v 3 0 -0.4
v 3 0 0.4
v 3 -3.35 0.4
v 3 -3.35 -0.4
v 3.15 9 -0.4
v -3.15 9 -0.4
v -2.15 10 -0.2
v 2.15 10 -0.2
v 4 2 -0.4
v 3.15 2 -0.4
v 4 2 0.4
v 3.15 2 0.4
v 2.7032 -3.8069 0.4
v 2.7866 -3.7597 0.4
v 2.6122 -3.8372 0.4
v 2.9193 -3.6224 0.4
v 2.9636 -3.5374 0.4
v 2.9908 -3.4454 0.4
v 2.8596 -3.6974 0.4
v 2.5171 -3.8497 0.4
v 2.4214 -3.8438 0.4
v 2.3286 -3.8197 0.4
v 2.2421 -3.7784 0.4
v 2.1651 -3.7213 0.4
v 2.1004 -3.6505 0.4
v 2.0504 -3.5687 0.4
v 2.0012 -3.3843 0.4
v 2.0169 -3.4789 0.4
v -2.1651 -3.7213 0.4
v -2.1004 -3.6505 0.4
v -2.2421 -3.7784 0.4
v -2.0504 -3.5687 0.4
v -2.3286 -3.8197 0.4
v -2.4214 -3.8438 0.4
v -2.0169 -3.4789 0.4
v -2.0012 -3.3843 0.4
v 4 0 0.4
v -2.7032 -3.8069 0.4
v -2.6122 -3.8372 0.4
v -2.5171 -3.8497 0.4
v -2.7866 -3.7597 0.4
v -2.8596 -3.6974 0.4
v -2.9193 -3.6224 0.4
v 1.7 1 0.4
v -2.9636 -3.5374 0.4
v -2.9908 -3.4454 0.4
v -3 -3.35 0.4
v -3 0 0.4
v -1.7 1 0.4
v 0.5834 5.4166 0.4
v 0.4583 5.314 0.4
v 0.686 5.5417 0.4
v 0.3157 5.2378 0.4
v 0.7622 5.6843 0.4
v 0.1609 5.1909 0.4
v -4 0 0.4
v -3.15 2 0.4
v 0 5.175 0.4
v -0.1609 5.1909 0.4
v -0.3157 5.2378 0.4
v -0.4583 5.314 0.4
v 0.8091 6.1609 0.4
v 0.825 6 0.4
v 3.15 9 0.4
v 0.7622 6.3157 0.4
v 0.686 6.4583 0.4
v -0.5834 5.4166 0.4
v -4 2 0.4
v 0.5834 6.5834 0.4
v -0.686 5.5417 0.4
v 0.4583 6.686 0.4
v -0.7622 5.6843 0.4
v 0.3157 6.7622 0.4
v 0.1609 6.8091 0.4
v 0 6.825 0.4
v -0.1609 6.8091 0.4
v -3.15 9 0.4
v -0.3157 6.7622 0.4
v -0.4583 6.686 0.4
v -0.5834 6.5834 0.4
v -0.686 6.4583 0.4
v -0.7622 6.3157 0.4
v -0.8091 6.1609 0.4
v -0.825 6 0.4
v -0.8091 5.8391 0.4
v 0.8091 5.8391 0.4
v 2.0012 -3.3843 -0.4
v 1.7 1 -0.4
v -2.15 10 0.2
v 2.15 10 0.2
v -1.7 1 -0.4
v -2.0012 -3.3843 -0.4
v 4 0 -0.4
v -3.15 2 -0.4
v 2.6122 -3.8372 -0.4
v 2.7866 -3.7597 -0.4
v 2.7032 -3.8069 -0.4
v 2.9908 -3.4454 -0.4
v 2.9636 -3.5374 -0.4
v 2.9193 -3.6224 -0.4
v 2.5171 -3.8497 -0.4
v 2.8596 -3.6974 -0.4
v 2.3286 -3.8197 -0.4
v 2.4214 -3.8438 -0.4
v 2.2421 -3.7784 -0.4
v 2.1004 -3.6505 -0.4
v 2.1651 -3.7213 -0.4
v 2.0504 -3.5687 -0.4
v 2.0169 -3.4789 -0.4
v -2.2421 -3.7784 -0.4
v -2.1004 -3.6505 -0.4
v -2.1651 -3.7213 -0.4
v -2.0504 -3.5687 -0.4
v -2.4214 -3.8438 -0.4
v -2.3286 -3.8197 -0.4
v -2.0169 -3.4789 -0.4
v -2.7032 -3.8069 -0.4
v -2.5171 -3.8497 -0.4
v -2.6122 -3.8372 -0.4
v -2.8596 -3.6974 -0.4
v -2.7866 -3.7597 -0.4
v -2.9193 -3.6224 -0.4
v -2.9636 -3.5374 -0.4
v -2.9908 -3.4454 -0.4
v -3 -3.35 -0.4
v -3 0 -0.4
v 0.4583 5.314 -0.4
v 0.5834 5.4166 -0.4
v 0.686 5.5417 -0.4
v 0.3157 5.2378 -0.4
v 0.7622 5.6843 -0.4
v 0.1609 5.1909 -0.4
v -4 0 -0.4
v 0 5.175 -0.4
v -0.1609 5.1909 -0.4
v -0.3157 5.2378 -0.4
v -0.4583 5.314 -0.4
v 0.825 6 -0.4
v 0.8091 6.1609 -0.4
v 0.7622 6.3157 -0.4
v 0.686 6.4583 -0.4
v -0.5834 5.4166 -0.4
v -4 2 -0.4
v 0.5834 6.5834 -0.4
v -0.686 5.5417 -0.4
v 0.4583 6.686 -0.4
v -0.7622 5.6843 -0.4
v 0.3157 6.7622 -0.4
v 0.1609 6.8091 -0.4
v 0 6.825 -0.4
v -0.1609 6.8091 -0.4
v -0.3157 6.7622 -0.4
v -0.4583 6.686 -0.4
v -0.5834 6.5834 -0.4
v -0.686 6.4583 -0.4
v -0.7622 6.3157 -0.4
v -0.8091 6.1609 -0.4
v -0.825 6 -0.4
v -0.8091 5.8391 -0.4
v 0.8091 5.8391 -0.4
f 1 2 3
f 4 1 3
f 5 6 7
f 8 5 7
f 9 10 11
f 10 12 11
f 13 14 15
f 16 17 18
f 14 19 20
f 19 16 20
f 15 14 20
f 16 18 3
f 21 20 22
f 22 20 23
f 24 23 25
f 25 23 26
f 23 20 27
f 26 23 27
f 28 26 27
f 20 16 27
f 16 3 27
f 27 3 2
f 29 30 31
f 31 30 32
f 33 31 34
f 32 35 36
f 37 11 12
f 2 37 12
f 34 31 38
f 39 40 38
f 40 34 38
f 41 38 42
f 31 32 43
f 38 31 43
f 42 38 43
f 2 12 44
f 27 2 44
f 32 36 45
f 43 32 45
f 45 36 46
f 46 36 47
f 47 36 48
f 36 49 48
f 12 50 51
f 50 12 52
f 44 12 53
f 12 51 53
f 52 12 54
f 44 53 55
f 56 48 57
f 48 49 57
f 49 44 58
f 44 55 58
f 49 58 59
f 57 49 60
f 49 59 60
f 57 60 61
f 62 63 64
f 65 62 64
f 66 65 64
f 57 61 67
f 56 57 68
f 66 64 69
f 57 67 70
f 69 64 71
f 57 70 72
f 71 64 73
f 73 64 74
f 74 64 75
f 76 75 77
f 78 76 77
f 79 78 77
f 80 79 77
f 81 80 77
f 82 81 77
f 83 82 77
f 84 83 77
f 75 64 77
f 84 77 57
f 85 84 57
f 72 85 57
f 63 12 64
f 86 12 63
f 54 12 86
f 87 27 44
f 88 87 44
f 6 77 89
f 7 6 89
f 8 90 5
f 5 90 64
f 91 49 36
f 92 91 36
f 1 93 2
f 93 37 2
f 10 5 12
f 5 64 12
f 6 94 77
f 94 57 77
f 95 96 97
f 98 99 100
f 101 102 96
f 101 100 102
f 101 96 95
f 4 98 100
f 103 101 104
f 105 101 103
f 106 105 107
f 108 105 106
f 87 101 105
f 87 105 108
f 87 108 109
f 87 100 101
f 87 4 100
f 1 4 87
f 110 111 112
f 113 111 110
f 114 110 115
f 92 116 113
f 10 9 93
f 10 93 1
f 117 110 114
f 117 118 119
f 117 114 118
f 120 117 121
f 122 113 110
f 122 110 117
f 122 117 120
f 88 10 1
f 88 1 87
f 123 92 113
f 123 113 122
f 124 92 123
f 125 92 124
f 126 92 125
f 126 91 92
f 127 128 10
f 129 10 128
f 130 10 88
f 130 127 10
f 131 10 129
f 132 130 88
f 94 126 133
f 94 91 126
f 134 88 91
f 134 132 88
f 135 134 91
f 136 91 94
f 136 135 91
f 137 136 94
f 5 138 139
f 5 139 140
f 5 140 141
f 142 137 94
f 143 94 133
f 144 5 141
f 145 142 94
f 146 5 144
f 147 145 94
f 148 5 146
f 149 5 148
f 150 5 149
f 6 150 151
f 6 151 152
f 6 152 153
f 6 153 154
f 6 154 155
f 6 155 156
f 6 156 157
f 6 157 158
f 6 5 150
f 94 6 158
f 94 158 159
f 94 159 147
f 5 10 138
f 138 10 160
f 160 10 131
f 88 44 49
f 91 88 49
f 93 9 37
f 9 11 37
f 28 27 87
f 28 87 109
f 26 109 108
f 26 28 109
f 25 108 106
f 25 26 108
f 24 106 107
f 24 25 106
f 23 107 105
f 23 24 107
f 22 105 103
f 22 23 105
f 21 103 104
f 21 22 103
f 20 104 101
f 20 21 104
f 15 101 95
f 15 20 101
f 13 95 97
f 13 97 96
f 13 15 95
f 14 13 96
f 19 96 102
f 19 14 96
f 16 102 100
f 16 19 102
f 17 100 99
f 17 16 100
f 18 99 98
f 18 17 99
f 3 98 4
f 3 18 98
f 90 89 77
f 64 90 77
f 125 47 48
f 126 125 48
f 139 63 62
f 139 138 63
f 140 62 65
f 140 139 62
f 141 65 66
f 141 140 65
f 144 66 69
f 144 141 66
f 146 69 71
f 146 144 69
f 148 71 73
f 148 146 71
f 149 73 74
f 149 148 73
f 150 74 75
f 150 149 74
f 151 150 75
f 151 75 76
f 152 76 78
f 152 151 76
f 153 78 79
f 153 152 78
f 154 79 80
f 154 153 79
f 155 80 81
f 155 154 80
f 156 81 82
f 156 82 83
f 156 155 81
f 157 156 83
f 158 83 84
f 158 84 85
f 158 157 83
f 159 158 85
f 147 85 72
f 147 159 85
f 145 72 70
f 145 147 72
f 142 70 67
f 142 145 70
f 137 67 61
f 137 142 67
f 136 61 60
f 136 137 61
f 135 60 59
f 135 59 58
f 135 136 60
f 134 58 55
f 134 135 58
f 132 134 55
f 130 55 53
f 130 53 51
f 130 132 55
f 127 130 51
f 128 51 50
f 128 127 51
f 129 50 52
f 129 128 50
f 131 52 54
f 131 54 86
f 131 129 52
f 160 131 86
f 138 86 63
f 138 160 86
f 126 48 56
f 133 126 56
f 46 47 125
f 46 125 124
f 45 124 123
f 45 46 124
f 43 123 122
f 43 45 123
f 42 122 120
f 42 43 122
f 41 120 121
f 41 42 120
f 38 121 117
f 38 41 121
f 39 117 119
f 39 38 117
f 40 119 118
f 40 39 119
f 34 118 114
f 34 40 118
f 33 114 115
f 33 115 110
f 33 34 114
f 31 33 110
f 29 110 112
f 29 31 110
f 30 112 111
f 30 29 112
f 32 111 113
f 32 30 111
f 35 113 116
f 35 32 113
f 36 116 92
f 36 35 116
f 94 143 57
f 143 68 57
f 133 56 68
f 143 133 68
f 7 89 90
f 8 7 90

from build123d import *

# Parameters (mm, degrees)
SKETCH_R     = 0.825
PAD_DEPTH    = 0.4
POCKET_DEPTH = 7.151


with BuildPart() as part:
    # Sketch → Pad (new body, symmetric)
    with BuildSketch(Plane.XY):
        with BuildLine():
            Line((-4, 0), (-4, 2))
            Line((-4, 2), (-3.15, 2))
            Line((-3.15, 2), (-3.15, 9))
            Line((-3.15, 9), (-2.15, 10))
            Line((-2.15, 10), (2.15, 10))
            Line((2.15, 10), (3.15, 9))
            Line((3.15, 9), (3.15, 2))
            Line((3.15, 2), (4, 2))
            Line((4, 2), (4, 0))
            Line((4, 0), (3, 0))
            Line((3, 0), (3, -3.35))
            ThreePointArc((2.001176, -3.384267), (2.517143, -3.849706), (3, -3.35))
            Line((2.001176, -3.384267), (1.7, 1))
            Line((1.7, 1), (-1.7, 1))
            Line((-1.7, 1), (-2.001176, -3.384267))
            ThreePointArc((-3, -3.35), (-2.517143, -3.849706), (-2.001176, -3.384267))
            Line((-3, -3.35), (-3, 0))
            Line((-3, 0), (-4, 0))
        make_face()
        with Locations((0, 6)):
            Circle(SKETCH_R, mode=Mode.SUBTRACT)
    extrude(amount=PAD_DEPTH, both=True)

    # Sketch001 (on Face3 of Pad) → Pocket (cut, through all)
    with BuildSketch(Plane(origin=(-3.15, 0, 0), x_dir=(0, -1, 0), z_dir=(-1, 0, 0))):
        Polygon((-9, 0.4), (-9, 1), (-11, 1), (-11, -1), (-9, -1), (-9, -0.4), (-10, -0.2), (-10, 0.2), align=None)
    extrude(amount=-POCKET_DEPTH, mode=Mode.SUBTRACT)


solid = part.part
